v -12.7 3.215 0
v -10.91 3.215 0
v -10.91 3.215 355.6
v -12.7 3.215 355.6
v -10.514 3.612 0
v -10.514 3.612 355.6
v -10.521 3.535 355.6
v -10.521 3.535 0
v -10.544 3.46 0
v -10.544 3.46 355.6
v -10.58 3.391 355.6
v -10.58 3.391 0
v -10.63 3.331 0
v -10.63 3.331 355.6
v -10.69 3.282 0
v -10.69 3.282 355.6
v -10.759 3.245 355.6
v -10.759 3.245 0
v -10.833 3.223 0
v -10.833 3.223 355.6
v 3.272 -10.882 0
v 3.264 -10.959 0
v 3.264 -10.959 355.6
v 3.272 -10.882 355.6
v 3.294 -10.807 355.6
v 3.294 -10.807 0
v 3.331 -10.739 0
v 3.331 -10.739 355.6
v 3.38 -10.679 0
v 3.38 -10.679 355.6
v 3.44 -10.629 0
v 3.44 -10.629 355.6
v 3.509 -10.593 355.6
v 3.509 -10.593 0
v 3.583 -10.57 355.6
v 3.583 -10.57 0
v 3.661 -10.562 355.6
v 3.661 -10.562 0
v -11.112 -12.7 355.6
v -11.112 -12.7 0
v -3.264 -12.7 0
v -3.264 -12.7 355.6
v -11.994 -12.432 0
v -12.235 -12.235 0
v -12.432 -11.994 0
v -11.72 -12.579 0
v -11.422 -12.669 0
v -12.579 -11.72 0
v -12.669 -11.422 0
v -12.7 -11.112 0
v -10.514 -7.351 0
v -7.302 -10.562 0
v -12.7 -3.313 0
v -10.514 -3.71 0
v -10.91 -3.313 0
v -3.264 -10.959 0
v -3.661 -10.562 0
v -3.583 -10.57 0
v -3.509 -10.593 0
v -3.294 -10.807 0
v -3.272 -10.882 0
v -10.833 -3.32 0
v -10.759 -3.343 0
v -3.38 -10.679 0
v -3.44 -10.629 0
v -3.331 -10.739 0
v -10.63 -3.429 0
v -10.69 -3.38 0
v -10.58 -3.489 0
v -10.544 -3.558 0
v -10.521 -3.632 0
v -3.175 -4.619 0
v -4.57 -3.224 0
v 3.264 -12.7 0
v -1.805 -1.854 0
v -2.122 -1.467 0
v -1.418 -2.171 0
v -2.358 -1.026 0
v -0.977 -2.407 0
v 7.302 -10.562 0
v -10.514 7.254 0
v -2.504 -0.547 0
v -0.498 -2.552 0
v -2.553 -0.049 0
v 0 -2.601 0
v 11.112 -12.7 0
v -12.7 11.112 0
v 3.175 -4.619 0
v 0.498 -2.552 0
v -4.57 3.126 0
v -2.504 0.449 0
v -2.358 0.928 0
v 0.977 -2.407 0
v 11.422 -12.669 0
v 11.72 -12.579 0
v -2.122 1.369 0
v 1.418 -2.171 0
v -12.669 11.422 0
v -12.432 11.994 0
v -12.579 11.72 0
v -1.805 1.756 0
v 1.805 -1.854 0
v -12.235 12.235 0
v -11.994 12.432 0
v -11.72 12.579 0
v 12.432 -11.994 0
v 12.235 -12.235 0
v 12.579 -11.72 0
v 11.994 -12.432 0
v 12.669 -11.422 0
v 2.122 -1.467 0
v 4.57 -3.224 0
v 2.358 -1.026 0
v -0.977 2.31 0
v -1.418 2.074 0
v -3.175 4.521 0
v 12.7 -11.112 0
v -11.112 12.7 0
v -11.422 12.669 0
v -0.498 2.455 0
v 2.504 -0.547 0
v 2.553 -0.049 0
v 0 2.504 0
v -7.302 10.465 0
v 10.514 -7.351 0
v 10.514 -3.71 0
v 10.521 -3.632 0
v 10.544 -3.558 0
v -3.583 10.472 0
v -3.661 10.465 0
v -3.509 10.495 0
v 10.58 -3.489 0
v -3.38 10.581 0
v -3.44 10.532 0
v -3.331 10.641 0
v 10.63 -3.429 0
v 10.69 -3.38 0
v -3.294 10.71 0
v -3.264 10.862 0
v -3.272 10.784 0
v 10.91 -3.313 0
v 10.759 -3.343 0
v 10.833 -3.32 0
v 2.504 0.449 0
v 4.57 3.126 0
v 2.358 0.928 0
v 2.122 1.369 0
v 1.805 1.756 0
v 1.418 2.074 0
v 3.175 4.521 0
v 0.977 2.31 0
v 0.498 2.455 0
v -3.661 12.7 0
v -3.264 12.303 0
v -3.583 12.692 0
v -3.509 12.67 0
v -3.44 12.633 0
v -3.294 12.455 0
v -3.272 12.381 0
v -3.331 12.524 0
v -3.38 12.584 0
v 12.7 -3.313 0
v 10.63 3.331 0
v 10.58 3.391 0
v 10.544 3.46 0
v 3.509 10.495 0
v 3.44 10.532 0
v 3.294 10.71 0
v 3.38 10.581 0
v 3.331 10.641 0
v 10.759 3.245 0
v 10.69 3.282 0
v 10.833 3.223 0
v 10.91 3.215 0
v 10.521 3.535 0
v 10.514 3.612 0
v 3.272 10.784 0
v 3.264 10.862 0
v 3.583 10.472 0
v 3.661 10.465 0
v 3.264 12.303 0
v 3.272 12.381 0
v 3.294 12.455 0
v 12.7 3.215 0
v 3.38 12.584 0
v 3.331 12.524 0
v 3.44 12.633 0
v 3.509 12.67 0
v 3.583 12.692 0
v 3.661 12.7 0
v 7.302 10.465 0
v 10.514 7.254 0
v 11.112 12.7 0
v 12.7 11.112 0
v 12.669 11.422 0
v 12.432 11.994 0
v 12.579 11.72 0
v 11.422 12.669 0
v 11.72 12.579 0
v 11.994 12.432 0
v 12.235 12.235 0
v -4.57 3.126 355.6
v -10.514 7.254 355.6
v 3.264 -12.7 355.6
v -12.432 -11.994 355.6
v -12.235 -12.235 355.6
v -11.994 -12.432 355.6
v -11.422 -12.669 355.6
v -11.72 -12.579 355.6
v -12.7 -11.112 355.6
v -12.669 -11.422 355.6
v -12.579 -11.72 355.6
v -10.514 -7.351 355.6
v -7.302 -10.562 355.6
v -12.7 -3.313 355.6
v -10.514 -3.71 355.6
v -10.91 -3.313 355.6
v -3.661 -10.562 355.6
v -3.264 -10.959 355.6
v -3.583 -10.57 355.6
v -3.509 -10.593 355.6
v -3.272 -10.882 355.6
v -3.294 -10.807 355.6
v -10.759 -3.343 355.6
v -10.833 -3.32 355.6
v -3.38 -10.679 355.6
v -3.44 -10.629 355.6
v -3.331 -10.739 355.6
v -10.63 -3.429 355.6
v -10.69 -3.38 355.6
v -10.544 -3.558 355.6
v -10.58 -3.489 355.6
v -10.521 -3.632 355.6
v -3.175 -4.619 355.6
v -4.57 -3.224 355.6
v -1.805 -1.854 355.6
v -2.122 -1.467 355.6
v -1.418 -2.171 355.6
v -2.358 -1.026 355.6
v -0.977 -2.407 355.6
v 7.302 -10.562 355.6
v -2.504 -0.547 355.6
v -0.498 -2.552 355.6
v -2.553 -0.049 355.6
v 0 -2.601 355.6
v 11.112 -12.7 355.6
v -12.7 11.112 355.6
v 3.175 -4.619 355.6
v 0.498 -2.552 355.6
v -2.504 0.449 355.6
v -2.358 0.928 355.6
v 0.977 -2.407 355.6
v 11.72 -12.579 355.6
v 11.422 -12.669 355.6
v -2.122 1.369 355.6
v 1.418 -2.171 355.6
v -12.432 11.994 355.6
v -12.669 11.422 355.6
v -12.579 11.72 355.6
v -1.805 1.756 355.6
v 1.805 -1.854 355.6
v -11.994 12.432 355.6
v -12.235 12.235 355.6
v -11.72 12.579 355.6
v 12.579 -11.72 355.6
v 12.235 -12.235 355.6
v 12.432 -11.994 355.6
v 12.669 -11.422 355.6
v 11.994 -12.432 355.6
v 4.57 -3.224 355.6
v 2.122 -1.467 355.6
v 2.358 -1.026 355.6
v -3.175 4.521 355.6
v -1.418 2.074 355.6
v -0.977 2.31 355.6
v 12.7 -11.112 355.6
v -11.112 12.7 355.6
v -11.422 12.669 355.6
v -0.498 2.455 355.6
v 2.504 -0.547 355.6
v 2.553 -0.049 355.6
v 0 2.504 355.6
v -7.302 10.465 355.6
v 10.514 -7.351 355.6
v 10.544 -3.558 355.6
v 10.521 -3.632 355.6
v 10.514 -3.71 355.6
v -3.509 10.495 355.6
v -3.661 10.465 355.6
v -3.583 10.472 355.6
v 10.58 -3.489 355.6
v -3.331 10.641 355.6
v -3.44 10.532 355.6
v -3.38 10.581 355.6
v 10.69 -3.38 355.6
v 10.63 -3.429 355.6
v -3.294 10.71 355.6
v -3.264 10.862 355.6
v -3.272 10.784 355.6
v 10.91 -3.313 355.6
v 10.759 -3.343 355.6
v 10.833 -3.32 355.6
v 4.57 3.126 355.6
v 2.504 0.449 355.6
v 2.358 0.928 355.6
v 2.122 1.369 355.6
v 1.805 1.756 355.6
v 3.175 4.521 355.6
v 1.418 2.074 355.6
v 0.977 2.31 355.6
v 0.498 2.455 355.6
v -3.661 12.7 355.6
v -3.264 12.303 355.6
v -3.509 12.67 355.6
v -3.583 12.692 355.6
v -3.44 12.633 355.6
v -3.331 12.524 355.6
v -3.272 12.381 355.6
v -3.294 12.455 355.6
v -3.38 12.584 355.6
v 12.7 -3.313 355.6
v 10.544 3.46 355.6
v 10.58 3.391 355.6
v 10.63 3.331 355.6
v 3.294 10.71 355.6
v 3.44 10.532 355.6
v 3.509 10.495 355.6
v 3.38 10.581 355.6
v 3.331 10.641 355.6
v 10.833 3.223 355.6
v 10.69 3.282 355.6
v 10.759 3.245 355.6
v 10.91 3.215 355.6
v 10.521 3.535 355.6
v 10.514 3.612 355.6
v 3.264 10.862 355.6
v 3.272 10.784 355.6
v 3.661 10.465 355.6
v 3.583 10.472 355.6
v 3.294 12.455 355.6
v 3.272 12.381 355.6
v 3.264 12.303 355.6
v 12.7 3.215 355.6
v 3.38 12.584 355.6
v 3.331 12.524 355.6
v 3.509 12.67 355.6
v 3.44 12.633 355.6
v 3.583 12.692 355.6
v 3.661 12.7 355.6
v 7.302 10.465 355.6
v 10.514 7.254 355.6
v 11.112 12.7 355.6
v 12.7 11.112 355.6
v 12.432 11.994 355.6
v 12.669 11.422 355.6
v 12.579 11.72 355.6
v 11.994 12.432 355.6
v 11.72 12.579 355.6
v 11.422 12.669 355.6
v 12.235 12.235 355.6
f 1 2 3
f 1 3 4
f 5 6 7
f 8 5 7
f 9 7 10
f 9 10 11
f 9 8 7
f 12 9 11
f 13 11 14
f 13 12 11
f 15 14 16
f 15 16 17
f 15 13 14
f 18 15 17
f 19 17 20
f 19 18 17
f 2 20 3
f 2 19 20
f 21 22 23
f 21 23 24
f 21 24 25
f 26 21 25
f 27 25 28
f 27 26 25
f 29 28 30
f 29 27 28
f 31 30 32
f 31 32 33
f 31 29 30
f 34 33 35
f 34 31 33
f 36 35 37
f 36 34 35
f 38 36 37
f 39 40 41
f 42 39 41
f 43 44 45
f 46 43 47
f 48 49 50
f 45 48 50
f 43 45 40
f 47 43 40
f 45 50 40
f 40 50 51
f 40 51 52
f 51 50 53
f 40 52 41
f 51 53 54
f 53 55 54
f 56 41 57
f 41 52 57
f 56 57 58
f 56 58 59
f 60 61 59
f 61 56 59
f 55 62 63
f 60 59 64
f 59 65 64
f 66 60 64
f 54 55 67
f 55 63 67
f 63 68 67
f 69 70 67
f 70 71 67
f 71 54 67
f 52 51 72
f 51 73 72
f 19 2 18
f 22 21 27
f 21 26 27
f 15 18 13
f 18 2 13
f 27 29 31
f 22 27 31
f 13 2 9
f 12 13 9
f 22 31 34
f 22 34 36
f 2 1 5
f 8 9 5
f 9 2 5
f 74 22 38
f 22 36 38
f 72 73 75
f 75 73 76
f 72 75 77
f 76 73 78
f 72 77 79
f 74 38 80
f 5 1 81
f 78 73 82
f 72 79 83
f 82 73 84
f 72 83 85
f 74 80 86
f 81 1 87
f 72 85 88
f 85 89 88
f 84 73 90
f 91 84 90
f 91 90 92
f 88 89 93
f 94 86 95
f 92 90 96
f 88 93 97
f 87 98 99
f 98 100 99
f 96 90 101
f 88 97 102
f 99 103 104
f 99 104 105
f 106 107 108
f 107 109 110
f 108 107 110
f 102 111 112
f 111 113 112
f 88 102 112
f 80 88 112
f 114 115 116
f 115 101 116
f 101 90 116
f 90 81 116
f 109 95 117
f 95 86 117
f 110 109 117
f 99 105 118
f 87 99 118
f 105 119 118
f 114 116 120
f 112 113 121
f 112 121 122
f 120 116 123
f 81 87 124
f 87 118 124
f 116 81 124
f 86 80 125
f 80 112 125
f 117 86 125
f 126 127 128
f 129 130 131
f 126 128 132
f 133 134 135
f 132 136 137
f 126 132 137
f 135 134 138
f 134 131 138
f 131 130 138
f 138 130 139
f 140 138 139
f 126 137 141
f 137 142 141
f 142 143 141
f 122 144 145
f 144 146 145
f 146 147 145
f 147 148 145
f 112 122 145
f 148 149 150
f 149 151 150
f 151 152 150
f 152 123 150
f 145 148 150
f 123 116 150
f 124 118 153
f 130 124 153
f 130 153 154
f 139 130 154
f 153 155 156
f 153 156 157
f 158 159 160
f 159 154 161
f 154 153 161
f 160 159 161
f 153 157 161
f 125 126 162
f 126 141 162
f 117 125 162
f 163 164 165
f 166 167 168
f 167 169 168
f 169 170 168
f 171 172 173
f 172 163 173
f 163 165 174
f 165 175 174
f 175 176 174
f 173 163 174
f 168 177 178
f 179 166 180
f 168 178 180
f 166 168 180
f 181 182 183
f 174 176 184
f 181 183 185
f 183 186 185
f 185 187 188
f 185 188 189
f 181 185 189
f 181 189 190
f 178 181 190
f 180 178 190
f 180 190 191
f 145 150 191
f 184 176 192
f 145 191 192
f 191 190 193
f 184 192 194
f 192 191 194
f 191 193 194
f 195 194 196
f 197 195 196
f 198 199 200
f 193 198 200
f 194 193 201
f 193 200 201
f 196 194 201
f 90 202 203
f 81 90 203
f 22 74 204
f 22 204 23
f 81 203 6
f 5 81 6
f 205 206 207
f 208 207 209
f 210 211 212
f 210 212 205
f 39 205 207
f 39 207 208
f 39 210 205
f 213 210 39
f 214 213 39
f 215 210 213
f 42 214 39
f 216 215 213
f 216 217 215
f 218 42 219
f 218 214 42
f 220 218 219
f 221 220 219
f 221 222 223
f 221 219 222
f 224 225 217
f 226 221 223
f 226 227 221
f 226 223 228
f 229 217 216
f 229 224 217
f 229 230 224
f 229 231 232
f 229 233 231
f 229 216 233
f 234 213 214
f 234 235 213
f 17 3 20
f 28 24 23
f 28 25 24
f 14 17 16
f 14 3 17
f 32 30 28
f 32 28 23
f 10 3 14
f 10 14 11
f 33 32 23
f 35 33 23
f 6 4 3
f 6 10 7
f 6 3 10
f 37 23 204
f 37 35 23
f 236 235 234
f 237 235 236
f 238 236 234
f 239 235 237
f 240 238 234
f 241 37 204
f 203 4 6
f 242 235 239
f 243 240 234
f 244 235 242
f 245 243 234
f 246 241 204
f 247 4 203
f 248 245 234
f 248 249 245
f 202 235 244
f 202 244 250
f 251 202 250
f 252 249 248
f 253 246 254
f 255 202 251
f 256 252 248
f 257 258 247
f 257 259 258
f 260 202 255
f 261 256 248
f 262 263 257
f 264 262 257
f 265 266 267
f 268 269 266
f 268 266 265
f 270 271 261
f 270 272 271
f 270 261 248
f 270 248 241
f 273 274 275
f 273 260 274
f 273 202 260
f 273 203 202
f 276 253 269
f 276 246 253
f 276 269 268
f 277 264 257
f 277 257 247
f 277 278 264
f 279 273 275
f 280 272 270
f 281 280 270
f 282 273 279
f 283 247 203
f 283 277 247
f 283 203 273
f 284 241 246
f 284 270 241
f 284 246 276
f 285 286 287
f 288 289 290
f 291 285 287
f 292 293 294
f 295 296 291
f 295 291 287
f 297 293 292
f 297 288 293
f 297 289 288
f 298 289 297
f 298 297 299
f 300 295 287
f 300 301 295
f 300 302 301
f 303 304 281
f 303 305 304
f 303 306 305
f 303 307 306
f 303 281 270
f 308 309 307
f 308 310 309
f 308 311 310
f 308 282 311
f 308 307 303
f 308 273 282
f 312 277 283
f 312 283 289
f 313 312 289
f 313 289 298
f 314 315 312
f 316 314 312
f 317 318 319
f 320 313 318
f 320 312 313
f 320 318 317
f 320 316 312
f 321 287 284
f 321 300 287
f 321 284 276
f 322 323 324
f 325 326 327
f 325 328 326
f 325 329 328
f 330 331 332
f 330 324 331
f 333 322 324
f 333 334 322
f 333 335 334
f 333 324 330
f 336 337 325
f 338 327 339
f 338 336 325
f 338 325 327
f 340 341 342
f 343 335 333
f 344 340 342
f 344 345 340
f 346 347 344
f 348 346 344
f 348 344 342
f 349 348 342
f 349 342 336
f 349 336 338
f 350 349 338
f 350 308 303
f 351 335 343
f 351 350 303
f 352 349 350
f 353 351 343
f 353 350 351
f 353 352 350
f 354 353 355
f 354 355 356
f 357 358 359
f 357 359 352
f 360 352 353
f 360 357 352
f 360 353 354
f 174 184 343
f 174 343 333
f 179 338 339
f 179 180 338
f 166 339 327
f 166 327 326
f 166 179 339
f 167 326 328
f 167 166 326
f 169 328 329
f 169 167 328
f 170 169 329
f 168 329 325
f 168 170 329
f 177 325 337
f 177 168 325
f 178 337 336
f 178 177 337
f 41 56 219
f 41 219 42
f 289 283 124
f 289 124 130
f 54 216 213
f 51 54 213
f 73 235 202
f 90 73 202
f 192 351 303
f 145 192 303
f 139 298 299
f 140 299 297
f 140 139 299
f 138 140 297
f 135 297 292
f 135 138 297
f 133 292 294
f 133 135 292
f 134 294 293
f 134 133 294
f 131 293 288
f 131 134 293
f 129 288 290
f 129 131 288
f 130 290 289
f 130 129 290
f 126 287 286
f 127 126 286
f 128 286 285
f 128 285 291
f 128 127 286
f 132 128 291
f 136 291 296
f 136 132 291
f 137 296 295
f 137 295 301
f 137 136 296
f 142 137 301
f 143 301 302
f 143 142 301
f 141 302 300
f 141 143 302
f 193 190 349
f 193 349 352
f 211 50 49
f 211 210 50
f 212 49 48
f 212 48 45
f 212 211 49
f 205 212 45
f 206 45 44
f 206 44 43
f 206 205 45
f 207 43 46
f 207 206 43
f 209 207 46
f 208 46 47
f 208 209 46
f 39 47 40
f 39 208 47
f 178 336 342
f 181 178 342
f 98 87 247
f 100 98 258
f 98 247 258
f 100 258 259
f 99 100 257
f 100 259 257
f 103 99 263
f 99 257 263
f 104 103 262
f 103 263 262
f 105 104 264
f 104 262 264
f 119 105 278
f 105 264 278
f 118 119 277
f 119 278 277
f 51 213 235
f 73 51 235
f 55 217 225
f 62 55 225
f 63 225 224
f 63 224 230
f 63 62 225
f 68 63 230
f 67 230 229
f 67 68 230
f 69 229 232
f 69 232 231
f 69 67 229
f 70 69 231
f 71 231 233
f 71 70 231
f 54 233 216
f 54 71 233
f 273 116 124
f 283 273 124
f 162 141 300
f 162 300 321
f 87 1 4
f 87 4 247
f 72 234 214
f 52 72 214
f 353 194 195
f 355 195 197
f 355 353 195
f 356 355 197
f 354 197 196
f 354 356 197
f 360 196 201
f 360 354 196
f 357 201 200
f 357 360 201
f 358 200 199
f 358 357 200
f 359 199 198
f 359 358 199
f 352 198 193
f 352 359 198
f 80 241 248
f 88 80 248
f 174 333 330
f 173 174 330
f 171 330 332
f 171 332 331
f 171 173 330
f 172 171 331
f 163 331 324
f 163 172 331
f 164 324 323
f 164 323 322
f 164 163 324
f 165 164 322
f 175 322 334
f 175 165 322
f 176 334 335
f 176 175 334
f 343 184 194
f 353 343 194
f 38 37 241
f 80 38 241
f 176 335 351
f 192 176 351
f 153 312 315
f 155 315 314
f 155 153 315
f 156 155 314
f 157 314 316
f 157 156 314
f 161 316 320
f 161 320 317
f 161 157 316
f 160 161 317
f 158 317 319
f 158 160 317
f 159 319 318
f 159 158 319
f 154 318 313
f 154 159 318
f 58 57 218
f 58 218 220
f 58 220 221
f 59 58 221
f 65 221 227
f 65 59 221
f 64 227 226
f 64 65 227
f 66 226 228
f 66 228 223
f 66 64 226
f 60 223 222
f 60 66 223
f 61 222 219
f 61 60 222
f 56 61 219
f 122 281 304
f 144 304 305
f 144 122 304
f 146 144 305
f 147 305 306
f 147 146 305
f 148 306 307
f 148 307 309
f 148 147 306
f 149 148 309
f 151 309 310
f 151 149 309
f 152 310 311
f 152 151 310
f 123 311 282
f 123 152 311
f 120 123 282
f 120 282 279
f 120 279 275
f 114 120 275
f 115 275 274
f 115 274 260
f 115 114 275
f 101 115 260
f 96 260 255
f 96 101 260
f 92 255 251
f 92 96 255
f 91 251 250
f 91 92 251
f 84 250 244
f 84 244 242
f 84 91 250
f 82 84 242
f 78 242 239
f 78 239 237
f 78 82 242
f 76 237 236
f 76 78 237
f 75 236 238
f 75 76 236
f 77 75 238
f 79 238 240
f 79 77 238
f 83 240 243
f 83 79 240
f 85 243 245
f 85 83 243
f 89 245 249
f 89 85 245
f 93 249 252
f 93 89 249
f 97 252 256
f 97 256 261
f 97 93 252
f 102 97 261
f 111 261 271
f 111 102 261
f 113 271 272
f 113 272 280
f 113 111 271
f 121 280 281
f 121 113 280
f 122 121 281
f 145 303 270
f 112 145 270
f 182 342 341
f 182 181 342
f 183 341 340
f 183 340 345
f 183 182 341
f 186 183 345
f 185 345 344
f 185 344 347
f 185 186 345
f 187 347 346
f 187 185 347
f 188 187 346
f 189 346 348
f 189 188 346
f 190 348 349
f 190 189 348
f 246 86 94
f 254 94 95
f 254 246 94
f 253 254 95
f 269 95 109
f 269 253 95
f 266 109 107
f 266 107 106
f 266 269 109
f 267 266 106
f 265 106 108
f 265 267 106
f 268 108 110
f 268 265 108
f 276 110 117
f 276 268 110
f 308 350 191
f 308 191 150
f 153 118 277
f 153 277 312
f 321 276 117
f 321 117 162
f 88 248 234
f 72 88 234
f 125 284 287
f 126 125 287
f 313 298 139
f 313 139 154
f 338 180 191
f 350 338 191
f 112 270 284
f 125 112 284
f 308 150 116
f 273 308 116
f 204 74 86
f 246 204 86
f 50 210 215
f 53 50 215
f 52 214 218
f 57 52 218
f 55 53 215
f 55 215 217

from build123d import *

# Parameters (mm, degrees)
SKETCH1_W           = 25.4
SKETCH1_H           = 25.4
BOSS_EXTRUDE1_DEPTH = 355.6
FILLET1_R           = 1.5875
HOLE1_OUTLINE_R     = 2.5527
HOLE1_DEPTH         = 355.6
SKETCH7_W           = 6.5278
SKETCH7_H           = 2.2352
CUT_EXTRUDE2_DEPTH  = 355.6
FILLET4_R           = 0.396875
CIRPATTERN2_DEPTH   = 355.6


# Read off the part's stored shape, not the designer's step: Hole1, CirPattern2
with BuildPart() as part:
    # Sketch1 → Boss-Extrude1 (new body)
    with BuildSketch(Plane.XY):
        Rectangle(SKETCH1_W, SKETCH1_H)
    extrude(amount=BOSS_EXTRUDE1_DEPTH)

    # Fillet1
    fillet1_edges = [part.edges().sort_by_distance(p)[0] for p in [
        (12.7, -12.7, 177.8),
        (-12.7, -12.7, 177.8),
        (-12.7, 12.7, 177.8),
        (12.7, 12.7, 177.8),
    ]]
    fillet(fillet1_edges, radius=FILLET1_R)

    # Hole1 outline → Hole1 (cut)
    with BuildSketch(Plane.XY):
        with Locations((0, -0.048792482)):
            Circle(HOLE1_OUTLINE_R)
    extrude(amount=HOLE1_DEPTH, mode=Mode.SUBTRACT)

    # Sketch7 → Cut-Extrude2 (cut)
    with BuildSketch(Plane.XY.offset(355.6)):
        with Locations((0, 11.5824)):
            Rectangle(SKETCH7_W, SKETCH7_H)
        Polygon((-3.175, 4.5212), (-7.3025, 10.4648), (7.3025, 10.4648), (3.175, 4.5212), align=None)
    extrude(amount=-CUT_EXTRUDE2_DEPTH, mode=Mode.SUBTRACT)

    # Fillet4
    fillet4_edges = [part.edges().sort_by_distance(p)[0] for p in [
        (-3.2639, 10.4648, 177.8),
        (-3.2639, 12.7, 177.8),
        (3.2639, 12.7, 177.8),
        (3.2639, 10.4648, 177.8),
    ]]
    fillet(fillet4_edges, radius=FILLET4_R)

    # CirPattern2 outline → CirPattern2 (cut)
    with BuildSketch(Plane.XY):
        with BuildLine():
            ThreePointArc((-3.660775, -10.562384964), (-3.380141996, -10.67862696), (-3.2639, -10.959259964))
            Line((-3.2639, -10.959259964), (-3.2639, -12.7))
            Line((-3.2639, -12.7), (3.2639, -12.7))
            Line((3.2639, -12.7), (3.2639, -10.959259964))
            ThreePointArc((3.2639, -10.959259964), (3.380141996, -10.67862696), (3.660775, -10.562384964))
            Line((3.660775, -10.562384964), (7.3025, -10.562384964))
            Line((7.3025, -10.562384964), (3.175, -4.618784964))
            Line((3.175, -4.618784964), (-3.175, -4.618784964))
            Line((-3.175, -4.618784964), (-7.3025, -10.562384964))
            Line((-7.3025, -10.562384964), (-3.660775, -10.562384964))
        make_face()
        with BuildLine():
            Line((-12.7, -3.312692482), (-10.910467482, -3.312692482))
            ThreePointArc((-10.910467482, -3.312692482), (-10.629834478, -3.428934478), (-10.513592482, -3.709567482))
            Line((-10.513592482, -3.709567482), (-10.513592482, -7.351292482))
            Line((-10.513592482, -7.351292482), (-4.569992482, -3.223792482))
            Line((-4.569992482, -3.223792482), (-4.569992482, 3.126207518))
            Line((-4.569992482, 3.126207518), (-10.513592482, 7.253707518))
            Line((-10.513592482, 7.253707518), (-10.513592482, 3.611982518))
            ThreePointArc((-10.513592482, 3.611982518), (-10.629834478, 3.331349514), (-10.910467482, 3.215107518))
            Line((-10.910467482, 3.215107518), (-12.7, 3.215107518))
            Line((-12.7, 3.215107518), (-12.7, -3.312692482))
        make_face()
        with BuildLine():
            ThreePointArc((10.513592482, -3.709567482), (10.629834478, -3.428934478), (10.910467482, -3.312692482))
            Line((10.910467482, -3.312692482), (12.7, -3.312692482))
            Line((12.7, -3.312692482), (12.7, 3.215107518))
            Line((12.7, 3.215107518), (10.910467482, 3.215107518))
            ThreePointArc((10.910467482, 3.215107518), (10.629834478, 3.331349514), (10.513592482, 3.611982518))
            Line((10.513592482, 3.611982518), (10.513592482, 7.253707518))
            Line((10.513592482, 7.253707518), (4.569992482, 3.126207518))
            Line((4.569992482, 3.126207518), (4.569992482, -3.223792482))
            Line((4.569992482, -3.223792482), (10.513592482, -7.351292482))
            Line((10.513592482, -7.351292482), (10.513592482, -3.709567482))
        make_face()
    extrude(amount=CIRPATTERN2_DEPTH, mode=Mode.SUBTRACT)


solid = part.part
